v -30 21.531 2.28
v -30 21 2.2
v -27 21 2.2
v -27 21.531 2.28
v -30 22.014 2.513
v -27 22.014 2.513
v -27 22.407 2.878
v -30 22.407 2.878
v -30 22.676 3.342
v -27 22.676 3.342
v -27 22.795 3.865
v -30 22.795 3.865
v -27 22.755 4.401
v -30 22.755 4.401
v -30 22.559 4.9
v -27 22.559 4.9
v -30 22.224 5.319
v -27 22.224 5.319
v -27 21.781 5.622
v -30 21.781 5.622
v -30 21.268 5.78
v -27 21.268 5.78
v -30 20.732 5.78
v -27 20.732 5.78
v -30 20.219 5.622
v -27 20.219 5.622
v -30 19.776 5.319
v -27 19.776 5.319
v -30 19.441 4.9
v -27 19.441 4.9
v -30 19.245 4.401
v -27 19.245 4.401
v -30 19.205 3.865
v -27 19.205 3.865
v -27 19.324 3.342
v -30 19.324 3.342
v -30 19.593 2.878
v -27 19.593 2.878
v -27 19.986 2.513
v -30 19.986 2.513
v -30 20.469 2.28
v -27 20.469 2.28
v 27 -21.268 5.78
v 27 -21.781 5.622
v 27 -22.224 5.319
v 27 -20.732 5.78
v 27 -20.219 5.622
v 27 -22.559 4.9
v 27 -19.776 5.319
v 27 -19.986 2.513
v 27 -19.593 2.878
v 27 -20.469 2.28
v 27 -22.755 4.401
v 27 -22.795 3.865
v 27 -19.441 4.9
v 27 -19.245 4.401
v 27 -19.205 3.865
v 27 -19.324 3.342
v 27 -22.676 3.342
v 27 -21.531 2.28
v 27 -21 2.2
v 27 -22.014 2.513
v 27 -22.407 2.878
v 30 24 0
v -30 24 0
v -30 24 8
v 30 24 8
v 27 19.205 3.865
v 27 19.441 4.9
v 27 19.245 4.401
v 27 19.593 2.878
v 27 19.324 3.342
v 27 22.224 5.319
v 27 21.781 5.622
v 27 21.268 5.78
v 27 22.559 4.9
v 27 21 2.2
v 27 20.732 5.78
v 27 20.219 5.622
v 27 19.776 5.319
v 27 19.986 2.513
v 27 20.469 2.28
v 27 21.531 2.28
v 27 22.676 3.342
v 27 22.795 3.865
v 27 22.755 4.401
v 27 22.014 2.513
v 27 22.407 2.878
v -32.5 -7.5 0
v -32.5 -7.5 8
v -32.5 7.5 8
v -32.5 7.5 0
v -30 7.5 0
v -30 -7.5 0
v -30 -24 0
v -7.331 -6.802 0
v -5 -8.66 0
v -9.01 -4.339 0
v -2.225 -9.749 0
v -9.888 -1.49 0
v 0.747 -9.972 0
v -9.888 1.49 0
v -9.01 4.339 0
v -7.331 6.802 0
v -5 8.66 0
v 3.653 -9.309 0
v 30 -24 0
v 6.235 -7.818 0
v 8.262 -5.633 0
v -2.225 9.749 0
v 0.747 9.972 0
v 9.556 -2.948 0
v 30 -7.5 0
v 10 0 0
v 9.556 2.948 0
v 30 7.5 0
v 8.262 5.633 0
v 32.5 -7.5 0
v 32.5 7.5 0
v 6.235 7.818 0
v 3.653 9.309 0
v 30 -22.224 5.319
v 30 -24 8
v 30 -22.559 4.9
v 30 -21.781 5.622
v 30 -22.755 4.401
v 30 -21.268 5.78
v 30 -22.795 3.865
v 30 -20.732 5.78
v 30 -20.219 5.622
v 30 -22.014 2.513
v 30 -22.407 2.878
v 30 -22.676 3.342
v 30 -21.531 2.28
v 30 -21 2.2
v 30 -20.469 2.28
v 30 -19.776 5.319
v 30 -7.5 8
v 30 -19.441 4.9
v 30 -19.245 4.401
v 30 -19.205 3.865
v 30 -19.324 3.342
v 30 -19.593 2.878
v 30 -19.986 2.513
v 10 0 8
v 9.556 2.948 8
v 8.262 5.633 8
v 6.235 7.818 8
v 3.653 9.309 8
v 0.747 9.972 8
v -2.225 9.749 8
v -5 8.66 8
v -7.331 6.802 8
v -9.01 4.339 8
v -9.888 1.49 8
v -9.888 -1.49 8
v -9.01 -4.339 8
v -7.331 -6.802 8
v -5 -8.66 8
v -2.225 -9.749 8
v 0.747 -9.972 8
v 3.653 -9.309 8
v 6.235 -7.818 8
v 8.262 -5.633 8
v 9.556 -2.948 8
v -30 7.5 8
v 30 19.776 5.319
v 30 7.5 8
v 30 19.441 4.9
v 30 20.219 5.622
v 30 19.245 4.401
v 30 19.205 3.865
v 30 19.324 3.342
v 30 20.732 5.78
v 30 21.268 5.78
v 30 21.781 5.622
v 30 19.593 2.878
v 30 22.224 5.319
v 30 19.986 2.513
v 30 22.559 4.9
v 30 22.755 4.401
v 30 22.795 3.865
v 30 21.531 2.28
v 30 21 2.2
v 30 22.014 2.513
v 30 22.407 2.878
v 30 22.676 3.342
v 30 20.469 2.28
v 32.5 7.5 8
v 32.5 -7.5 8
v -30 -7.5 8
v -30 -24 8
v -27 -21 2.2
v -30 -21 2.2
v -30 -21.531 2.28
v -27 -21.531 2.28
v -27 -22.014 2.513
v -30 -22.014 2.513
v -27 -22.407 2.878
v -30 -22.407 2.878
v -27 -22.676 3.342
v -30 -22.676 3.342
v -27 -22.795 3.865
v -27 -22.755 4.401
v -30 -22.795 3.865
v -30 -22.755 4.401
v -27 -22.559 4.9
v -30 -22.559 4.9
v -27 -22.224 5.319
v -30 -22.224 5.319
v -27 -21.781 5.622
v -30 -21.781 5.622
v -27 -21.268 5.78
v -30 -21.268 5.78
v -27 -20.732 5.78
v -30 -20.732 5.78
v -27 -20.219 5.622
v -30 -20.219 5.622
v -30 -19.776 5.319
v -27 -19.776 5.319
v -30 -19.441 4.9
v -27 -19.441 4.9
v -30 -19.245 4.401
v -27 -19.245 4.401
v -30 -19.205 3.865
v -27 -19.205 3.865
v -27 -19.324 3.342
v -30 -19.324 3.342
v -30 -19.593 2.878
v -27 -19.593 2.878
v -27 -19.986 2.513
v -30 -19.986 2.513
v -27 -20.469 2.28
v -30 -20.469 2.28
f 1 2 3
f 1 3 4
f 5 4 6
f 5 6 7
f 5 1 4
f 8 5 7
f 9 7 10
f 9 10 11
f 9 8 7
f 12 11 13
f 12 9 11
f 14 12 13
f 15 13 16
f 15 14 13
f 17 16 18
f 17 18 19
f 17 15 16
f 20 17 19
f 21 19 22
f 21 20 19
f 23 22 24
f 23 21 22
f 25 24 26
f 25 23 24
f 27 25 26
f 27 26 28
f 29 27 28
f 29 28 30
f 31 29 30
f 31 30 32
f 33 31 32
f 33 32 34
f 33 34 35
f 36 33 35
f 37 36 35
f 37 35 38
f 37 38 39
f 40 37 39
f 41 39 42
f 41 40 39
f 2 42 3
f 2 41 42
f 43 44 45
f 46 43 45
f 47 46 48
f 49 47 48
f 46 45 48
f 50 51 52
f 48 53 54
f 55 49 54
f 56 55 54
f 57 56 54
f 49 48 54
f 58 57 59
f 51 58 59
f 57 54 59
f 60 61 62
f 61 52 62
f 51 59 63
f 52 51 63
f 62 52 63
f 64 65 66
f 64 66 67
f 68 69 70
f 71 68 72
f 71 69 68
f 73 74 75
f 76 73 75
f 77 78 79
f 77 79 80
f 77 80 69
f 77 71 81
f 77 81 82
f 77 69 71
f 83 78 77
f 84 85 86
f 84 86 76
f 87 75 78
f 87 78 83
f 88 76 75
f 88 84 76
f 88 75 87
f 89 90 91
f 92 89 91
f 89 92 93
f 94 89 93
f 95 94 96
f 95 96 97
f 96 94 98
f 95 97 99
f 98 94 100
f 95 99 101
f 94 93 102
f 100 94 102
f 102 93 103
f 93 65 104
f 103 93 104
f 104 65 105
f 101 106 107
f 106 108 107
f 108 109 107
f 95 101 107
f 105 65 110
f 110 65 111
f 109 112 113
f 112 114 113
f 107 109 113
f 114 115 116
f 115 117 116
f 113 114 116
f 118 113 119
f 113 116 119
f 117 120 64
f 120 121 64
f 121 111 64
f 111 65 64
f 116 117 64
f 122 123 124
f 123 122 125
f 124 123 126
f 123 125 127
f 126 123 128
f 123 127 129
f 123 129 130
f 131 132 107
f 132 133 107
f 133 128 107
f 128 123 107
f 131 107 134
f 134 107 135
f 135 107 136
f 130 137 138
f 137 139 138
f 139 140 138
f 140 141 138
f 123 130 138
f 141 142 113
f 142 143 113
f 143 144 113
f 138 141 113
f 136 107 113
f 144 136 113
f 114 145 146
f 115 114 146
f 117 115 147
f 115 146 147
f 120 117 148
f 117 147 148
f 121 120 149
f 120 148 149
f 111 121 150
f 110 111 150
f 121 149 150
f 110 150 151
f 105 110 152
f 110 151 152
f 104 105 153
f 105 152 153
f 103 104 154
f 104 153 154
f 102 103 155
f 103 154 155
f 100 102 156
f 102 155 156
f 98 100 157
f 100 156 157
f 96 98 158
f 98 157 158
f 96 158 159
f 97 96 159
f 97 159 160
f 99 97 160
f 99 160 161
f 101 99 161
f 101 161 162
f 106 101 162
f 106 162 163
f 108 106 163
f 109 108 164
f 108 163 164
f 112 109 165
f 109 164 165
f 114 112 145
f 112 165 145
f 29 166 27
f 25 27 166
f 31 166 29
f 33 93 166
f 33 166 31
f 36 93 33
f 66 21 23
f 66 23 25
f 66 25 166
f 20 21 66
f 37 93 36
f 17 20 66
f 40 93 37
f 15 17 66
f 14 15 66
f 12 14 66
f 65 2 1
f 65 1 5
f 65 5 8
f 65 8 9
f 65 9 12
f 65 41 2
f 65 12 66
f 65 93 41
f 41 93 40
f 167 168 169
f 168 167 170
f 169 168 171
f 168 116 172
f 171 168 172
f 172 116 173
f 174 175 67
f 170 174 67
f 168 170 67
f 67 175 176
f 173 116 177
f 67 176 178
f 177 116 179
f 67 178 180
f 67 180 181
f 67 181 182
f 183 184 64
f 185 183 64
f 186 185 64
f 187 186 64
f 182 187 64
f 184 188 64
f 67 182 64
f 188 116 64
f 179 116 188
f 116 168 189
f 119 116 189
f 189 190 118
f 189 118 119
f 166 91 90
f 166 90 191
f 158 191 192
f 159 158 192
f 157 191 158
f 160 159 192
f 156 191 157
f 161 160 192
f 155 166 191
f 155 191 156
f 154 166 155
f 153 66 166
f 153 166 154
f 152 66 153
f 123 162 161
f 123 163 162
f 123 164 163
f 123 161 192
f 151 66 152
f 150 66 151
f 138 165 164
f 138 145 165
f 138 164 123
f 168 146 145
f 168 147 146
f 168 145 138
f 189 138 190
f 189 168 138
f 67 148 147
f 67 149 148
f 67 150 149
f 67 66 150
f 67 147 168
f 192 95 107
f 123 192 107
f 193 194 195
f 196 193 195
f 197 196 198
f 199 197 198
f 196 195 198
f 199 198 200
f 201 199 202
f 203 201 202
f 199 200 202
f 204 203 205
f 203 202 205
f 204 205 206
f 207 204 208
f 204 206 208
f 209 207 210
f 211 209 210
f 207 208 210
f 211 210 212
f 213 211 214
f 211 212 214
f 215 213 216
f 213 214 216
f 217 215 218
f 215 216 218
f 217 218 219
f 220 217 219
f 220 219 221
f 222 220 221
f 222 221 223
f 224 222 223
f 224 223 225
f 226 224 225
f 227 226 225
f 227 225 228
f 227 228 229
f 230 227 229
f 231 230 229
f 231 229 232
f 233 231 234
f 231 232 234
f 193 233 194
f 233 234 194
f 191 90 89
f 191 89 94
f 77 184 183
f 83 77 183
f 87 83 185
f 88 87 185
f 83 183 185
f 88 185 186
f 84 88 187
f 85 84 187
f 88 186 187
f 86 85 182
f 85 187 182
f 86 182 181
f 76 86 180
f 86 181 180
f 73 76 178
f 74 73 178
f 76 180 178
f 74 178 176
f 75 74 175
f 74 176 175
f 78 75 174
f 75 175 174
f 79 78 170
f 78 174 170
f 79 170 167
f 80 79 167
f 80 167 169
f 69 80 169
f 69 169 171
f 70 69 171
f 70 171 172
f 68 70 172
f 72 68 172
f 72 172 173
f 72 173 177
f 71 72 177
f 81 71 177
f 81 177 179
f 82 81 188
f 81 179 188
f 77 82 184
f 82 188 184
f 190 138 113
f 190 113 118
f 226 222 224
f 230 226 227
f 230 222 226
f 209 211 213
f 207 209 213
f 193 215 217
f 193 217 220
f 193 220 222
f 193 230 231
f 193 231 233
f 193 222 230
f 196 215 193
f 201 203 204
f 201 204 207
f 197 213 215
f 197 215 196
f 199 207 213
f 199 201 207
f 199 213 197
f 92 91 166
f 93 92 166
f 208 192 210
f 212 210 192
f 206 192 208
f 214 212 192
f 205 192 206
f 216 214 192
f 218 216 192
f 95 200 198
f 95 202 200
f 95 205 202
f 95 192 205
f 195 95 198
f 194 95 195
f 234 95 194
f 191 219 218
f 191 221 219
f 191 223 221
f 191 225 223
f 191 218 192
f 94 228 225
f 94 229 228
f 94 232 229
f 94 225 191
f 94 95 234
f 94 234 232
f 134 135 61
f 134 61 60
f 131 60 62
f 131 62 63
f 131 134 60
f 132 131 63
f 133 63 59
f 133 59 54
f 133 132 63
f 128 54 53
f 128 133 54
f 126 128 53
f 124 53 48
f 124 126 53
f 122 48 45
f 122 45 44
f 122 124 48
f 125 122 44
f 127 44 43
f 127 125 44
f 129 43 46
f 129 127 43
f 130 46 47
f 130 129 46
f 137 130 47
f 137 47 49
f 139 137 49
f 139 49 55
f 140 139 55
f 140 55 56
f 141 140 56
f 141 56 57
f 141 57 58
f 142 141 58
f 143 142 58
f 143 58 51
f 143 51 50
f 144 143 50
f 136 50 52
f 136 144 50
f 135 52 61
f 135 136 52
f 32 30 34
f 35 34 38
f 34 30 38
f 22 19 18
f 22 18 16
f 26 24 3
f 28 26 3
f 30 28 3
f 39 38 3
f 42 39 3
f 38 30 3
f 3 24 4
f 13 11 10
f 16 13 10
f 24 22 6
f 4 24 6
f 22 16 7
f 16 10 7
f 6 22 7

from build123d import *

# Parameters (mm, degrees)
SKETCH_1_W               = 60
SKETCH_1_H               = 48
EXTRUDE_1_DEPTH          = 8
SKETCH_3_W               = 65
SKETCH_3_H               = 15
EXTRUDE_2_DEPTH          = 8
SKETCH_5_R               = 1.8
CUT_EXTRUDE_1_DEPTH      = 3
MIRROR_3_COPY_1_SKETCH_R = 1.8
MIRROR_3_COPY_1_DEPTH    = 3
MIRROR_3_COPY_2_SKETCH_R = 1.8
MIRROR_3_COPY_2_DEPTH    = 3
SKETCH_7_R               = 10
CUT_EXTRUDE_2_DEPTH      = 8


with BuildPart() as part:
    # 草图1 → 凸台-拉伸1 (new body)
    with BuildSketch(Plane.XY):
        Rectangle(SKETCH_1_W, SKETCH_1_H)
    extrude(amount=EXTRUDE_1_DEPTH)

    # 草图3 → 凸台-拉伸2 (add)
    with BuildSketch(Plane.XY.offset(8)):
        Rectangle(SKETCH_3_W, SKETCH_3_H)
    extrude(amount=-EXTRUDE_2_DEPTH)

    # 草图5 → 切除-拉伸1 (cut)
    with BuildSketch(Plane(origin=(30, 0, 0), x_dir=(0, 0, -1), z_dir=(1, 0, 0))):
        with Locations((-4, 21)):
            Circle(SKETCH_5_R)
    cut_extrude_1 = extrude(amount=-CUT_EXTRUDE_1_DEPTH, mode=Mode.SUBTRACT)

    # 镜向2: 切除-拉伸1 across plane
    add(cut_extrude_1.mirror(Plane.ZX), mode=Mode.SUBTRACT)

    # 镜向3 copy 1 sketch → 镜向3 copy 1 (cut)
    with BuildSketch(Plane(origin=(-30, 0, 0), x_dir=(0, 0, -1), z_dir=(-1, 0, 0))):
        with Locations((-4, 21)):
            Circle(MIRROR_3_COPY_1_SKETCH_R)
    extrude(amount=-MIRROR_3_COPY_1_DEPTH, mode=Mode.SUBTRACT)

    # 镜向3 copy 2 sketch → 镜向3 copy 2 (cut)
    with BuildSketch(Plane(origin=(-30, 0, 0), x_dir=(0, 0, -1), z_dir=(-1, 0, 0))):
        with Locations((-4, -21)):
            Circle(MIRROR_3_COPY_2_SKETCH_R)
    extrude(amount=-MIRROR_3_COPY_2_DEPTH, mode=Mode.SUBTRACT)

    # 草图7 → 切除-拉伸2 (cut)
    with BuildSketch(Plane.XY.offset(8)):
        Circle(SKETCH_7_R)
    extrude(amount=-CUT_EXTRUDE_2_DEPTH, mode=Mode.SUBTRACT)


solid = part.part
